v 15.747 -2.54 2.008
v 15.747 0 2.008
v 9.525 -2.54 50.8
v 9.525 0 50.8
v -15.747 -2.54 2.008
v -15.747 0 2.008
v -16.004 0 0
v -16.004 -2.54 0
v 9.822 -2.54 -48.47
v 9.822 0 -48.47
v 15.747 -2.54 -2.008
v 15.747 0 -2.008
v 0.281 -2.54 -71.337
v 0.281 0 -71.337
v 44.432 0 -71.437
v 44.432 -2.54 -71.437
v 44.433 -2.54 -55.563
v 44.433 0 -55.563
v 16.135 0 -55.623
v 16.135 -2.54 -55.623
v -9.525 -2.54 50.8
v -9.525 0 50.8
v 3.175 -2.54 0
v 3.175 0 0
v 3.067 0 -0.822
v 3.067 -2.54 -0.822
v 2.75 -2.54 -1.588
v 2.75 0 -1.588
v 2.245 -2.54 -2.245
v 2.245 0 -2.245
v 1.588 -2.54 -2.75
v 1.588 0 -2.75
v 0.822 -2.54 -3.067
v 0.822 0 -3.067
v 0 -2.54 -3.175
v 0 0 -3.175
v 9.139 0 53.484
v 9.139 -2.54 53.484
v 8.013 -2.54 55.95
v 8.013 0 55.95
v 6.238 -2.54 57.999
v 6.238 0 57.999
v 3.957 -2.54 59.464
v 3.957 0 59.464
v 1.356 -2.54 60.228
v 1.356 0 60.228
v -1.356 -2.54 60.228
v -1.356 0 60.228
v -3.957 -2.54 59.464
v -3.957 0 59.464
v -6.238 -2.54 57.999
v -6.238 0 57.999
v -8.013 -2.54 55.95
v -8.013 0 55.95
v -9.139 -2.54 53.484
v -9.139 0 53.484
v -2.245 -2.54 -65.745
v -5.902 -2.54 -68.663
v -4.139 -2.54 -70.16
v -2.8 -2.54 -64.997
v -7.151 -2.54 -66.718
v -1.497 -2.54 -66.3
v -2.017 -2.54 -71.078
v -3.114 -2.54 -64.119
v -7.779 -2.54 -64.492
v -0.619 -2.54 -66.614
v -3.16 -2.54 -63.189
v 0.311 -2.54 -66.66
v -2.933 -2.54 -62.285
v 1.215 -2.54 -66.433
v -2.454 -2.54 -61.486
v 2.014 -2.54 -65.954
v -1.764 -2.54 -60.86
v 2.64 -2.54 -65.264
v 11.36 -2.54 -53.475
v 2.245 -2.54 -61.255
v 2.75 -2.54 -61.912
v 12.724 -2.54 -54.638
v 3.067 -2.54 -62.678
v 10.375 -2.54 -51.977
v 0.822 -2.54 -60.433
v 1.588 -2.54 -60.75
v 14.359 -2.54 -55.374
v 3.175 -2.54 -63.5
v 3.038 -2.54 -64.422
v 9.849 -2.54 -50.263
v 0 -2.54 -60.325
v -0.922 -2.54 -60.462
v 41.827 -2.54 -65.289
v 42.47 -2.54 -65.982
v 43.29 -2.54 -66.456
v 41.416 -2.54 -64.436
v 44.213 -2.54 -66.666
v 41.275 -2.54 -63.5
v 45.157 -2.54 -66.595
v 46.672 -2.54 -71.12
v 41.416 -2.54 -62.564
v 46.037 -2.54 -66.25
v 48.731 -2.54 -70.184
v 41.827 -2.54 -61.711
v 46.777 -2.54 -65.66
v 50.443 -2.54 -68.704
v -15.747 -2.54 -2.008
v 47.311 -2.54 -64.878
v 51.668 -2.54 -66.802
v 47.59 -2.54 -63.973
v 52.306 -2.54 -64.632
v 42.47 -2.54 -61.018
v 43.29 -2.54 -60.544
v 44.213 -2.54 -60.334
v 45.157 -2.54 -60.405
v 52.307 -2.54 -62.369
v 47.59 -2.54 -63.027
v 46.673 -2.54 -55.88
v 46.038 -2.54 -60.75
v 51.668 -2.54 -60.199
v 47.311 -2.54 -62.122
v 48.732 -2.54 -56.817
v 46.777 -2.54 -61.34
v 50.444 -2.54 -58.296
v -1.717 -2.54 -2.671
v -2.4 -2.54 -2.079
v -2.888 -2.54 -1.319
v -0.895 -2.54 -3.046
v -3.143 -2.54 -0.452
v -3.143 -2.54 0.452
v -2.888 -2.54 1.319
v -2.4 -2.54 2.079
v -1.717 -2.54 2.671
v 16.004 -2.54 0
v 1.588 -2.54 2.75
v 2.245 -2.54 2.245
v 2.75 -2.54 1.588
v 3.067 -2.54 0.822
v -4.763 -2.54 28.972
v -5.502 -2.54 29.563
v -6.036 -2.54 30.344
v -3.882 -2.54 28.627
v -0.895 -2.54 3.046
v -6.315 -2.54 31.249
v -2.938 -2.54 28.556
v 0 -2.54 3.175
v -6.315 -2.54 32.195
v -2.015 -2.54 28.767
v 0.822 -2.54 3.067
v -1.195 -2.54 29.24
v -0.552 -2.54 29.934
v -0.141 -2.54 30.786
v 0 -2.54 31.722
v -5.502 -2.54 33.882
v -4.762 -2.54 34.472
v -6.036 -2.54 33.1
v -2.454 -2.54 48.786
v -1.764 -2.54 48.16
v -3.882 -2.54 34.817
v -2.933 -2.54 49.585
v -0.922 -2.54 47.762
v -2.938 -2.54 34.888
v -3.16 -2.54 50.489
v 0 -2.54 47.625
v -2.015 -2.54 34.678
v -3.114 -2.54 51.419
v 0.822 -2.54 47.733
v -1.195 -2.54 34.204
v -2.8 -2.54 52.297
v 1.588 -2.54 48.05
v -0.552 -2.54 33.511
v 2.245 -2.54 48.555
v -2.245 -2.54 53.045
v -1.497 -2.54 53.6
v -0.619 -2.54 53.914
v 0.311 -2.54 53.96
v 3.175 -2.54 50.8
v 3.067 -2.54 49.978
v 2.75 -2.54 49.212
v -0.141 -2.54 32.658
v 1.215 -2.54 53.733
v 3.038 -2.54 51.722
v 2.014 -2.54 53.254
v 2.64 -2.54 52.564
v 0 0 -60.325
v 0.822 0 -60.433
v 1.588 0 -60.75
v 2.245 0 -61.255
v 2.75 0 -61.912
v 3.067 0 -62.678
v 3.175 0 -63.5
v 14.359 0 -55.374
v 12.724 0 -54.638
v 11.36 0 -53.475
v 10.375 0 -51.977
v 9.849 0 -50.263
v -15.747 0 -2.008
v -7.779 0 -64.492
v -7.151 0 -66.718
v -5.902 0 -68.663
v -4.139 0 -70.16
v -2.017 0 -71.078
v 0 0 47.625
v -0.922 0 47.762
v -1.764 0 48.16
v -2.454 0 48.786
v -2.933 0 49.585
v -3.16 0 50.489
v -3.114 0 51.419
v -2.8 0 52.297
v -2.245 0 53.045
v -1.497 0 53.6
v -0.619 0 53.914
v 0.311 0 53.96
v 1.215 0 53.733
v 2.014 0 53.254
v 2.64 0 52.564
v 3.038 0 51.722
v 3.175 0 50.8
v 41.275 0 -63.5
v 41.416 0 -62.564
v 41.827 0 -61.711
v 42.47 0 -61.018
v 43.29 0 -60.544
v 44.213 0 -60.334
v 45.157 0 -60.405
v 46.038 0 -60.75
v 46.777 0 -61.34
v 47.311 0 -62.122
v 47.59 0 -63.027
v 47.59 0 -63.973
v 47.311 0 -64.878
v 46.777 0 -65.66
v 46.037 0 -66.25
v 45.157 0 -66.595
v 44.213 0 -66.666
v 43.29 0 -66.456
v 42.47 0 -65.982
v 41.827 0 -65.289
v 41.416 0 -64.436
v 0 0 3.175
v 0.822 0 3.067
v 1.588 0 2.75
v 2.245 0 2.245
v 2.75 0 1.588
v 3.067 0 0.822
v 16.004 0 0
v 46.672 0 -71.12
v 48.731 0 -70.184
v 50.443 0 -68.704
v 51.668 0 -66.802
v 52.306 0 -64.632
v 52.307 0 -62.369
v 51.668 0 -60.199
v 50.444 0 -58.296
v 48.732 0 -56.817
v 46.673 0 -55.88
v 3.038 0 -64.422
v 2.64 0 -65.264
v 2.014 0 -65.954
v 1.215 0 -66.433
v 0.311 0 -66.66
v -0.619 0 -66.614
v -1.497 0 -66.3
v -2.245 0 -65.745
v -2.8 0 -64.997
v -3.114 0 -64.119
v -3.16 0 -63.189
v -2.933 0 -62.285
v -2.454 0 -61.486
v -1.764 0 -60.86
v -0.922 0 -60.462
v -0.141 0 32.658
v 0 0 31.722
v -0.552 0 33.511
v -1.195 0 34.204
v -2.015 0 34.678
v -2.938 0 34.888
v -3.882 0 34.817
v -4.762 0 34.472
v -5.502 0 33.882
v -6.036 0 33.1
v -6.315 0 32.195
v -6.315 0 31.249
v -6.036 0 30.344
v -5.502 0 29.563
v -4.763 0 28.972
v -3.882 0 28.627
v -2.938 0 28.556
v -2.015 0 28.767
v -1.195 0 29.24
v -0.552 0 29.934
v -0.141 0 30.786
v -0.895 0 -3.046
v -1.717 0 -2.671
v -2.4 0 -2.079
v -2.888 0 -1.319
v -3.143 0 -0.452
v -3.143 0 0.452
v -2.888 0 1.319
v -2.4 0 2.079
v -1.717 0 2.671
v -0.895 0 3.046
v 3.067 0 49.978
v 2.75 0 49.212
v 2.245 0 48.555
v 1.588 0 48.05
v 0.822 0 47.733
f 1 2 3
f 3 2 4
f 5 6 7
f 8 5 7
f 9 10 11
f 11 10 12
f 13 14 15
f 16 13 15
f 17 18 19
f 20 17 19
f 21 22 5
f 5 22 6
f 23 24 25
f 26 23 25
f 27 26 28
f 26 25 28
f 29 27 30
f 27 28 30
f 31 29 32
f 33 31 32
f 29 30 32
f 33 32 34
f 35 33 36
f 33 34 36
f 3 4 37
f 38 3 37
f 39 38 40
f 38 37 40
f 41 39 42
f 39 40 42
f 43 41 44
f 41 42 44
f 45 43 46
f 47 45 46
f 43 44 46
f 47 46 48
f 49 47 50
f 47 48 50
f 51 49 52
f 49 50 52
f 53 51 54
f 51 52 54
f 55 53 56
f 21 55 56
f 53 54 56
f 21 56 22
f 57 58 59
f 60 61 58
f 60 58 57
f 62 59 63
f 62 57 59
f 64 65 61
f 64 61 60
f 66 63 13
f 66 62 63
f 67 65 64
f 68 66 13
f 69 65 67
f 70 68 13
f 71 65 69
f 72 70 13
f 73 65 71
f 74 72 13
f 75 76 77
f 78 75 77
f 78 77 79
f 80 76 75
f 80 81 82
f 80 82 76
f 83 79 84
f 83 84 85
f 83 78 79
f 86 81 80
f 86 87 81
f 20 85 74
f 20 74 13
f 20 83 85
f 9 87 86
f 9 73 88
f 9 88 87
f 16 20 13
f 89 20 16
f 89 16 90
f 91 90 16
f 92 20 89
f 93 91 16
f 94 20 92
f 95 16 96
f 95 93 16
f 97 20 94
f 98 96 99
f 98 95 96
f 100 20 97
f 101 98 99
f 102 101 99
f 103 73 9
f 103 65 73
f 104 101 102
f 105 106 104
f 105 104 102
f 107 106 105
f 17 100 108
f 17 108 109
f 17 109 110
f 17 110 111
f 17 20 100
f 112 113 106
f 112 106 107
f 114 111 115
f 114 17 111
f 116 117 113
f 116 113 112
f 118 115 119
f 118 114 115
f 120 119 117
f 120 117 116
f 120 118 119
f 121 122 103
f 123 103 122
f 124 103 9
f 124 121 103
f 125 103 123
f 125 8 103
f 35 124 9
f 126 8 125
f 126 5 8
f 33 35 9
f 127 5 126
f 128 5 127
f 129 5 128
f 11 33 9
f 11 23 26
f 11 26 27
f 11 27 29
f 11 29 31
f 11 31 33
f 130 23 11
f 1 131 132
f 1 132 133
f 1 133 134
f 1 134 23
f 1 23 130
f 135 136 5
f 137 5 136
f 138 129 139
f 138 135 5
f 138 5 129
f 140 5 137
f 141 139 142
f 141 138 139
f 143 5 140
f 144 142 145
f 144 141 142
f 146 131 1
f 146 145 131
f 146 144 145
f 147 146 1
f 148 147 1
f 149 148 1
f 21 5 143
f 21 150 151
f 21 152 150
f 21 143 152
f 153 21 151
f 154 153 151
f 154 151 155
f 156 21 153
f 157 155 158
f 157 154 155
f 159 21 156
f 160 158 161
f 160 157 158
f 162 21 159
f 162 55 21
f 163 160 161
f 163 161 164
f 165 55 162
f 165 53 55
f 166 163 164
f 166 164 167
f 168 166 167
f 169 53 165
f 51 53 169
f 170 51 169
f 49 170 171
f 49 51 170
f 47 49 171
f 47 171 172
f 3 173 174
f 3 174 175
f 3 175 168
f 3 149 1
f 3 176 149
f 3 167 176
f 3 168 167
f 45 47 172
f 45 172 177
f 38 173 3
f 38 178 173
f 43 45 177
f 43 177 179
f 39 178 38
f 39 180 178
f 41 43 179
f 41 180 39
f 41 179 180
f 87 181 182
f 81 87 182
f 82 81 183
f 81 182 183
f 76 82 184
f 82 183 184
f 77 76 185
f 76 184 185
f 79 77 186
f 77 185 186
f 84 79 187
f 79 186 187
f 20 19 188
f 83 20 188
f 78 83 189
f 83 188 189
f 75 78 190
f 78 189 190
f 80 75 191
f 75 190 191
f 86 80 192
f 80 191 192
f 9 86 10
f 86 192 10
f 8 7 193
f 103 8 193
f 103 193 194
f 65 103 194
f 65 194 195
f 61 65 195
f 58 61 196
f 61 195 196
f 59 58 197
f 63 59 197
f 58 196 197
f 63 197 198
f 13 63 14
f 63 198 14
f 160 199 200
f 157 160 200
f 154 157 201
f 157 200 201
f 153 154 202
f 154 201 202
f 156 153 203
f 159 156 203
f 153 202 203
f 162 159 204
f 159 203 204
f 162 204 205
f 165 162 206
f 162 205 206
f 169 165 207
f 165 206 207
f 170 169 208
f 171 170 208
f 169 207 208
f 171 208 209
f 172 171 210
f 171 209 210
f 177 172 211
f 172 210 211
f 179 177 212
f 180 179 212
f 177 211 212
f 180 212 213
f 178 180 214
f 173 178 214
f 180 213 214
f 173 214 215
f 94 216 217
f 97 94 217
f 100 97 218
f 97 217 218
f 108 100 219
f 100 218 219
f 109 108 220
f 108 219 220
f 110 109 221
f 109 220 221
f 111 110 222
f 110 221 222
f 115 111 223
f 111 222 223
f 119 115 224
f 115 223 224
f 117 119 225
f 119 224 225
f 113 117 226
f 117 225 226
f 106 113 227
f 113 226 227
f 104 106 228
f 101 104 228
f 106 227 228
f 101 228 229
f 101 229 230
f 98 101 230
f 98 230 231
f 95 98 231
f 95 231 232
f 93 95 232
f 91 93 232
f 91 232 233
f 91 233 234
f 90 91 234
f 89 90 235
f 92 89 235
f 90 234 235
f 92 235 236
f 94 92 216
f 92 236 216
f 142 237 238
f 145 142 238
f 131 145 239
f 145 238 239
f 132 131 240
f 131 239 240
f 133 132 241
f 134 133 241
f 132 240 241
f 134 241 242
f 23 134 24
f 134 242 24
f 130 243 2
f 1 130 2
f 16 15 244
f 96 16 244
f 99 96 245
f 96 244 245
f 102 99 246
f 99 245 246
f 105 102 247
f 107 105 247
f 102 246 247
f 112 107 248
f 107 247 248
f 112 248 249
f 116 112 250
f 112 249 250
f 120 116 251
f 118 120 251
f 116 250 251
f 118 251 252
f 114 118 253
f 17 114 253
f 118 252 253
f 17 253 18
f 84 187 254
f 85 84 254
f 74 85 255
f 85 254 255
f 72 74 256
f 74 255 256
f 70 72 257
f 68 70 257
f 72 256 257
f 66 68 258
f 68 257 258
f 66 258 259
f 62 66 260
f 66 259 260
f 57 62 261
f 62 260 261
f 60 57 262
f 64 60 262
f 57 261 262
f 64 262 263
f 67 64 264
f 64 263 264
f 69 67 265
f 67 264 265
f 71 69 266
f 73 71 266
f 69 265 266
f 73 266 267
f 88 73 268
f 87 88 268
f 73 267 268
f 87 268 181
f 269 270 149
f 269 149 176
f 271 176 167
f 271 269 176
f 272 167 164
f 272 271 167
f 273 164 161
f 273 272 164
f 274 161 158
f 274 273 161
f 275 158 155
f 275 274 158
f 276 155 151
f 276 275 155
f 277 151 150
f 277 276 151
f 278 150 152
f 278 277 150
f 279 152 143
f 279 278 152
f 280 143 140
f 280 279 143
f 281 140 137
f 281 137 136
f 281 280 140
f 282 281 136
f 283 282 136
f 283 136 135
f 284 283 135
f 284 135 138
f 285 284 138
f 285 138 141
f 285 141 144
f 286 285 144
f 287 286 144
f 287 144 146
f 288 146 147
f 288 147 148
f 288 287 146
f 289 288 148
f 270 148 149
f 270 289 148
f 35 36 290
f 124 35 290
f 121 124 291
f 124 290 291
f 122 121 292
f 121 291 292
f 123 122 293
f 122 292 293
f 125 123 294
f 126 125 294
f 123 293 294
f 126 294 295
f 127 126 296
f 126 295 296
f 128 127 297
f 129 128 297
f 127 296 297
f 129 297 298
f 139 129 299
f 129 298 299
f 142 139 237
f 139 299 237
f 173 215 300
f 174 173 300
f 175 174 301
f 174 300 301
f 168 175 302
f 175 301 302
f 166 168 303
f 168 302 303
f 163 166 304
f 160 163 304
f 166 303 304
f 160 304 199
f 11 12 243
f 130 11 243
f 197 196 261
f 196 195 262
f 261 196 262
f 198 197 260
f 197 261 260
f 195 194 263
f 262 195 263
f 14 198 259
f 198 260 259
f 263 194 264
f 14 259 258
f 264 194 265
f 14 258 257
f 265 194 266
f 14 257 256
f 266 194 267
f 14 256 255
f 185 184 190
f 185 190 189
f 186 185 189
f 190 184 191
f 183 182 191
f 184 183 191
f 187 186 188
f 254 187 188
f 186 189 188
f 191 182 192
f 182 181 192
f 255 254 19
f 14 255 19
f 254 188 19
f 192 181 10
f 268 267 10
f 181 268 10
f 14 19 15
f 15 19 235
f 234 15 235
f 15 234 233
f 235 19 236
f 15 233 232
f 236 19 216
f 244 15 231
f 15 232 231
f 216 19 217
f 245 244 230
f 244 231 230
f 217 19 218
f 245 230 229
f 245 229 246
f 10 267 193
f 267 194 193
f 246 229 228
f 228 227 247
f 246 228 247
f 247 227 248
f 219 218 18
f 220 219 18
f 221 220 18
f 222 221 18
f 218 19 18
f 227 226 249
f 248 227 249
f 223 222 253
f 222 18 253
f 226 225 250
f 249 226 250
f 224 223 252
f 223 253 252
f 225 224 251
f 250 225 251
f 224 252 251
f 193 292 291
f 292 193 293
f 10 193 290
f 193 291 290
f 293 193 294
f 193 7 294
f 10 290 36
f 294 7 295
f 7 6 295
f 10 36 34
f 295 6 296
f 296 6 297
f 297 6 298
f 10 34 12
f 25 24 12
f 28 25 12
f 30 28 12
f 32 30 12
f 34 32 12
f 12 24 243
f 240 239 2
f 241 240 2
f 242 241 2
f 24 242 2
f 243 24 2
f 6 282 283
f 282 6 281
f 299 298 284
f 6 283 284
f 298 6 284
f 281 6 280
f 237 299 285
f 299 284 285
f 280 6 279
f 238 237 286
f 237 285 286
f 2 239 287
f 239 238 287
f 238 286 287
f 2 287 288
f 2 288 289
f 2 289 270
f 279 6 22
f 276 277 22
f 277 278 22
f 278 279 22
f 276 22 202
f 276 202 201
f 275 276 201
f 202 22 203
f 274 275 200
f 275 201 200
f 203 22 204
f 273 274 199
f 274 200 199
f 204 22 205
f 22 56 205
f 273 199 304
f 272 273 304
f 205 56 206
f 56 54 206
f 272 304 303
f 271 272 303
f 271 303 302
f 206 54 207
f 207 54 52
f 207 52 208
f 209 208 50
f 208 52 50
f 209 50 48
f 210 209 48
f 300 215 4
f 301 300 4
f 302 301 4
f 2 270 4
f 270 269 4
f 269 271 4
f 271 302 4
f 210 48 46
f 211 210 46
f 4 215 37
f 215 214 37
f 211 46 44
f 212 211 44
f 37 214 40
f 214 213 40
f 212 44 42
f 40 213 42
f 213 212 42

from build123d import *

# Parameters (mm, degrees)
F0_R     = 3.175
F1_DEPTH = 2.54
F2_DEPTH = 2.54


with BuildPart() as f1:
    # F0 (on Front) → F1 (new body)
    with BuildSketch(Plane.XZ):
        with BuildLine():
            ThreePointArc((-9.525, 50.8), (-6.7351920908, 44.0648079092), (0, 41.275))
            ThreePointArc((0, 41.275), (6.7351920908, 44.0648079092), (9.525, 50.8))
            ThreePointArc((9.525, 50.8), (0, 60.325), (-9.525, 50.8))
        make_face()
        with BuildLine():
            ThreePointArc((3.175, 50.8), (2.2450640303, 48.5549359697), (0, 47.625))
            ThreePointArc((0, 47.625), (-2.2450640303, 53.0450640303), (3.175, 50.8))
        make_face(mode=Mode.SUBTRACT)
        with BuildLine():
            ThreePointArc((9.525, 50.8), (6.7351920908, 44.0648079092), (0, 41.275))
            Line((0, 41.275), (0, 31.7220508101))
            Line((0, 31.7220508101), (0, 15.875))
            ThreePointArc((0, 15.875), (10.4912828764, 11.9142187578), (15.747456912, 2.0082892734))
            Line((15.747456912, 2.0082892734), (9.525, 50.8))
        make_face()
        with BuildLine():
            Line((0, 31.7220508101), (0, 41.275))
            ThreePointArc((0, 41.275), (-6.7351920908, 44.0648079092), (-9.525, 50.8))
            Line((-9.525, 50.8), (-15.7474568676, 2.0082896216))
            ThreePointArc((-15.7474568676, 2.0082896216), (-10.4912827447, 11.9142188737), (0, 15.875))
            Line((0, 15.875), (0, 31.7220508101))
        make_face()
        with Locations((-3.175, 31.7220508101)):
            Circle(F0_R, mode=Mode.SUBTRACT)
        with BuildLine():
            ThreePointArc((15.747456912, 2.0082892734), (10.4912828764, 11.9142187578), (0, 15.875))
            Line((0, 15.875), (0, 3.175))
            ThreePointArc((0, 3.175), (2.2450640303, 2.2450640303), (3.175, 0))
            ThreePointArc((3.175, 0), (2.2450640303, -2.2450640303), (0, -3.175))
            Line((0, -3.175), (0, -15.875))
            ThreePointArc((0, -15.875), (10.4912827447, -11.9142188737), (15.7474568676, -2.0082896216))
            ThreePointArc((15.7474568676, -2.0082896216), (15.8430821303, -1.006167786), (15.875, 0))
            ThreePointArc((15.875, 0), (15.8430821414, 1.0061676109), (15.747456912, 2.0082892734))
        make_face()
        with BuildLine():
            Line((0, 3.175), (0, 15.875))
            ThreePointArc((0, 15.875), (-10.4912827447, 11.9142188737), (-15.7474568676, 2.0082896216))
            ThreePointArc((-15.7474568676, 2.0082896216), (-15.875, 8.81e-08), (-15.7474568899, -2.0082894468))
            ThreePointArc((-15.7474568899, -2.0082894468), (-10.4912828108, -11.9142188155), (0, -15.875))
            Line((0, -15.875), (0, -3.175))
            ThreePointArc((0, -3.175), (-3.175, 0), (0, 3.175))
        make_face()
        with BuildLine():
            ThreePointArc((-15.7474568899, -2.0082894468), (-15.875, 8.81e-08), (-15.7474568676, 2.0082896216))
            Line((-15.7474568676, 2.0082896216), (-16.0035761028, 0))
            Line((-16.0035761028, 0), (-15.7474568899, -2.0082894468))
        make_face()
        with BuildLine():
            Line((16.0035761028, 0), (15.747456912, 2.0082892734))
            ThreePointArc((15.747456912, 2.0082892734), (15.8430821414, 1.0061676109), (15.875, 0))
            ThreePointArc((15.875, 0), (15.8430821303, -1.006167786), (15.7474568676, -2.0082896216))
            Line((15.7474568676, -2.0082896216), (16.0035761028, 0))
        make_face()
        with BuildLine():
            ThreePointArc((0, -15.875), (-10.4912828108, -11.9142188155), (-15.7474568899, -2.0082894468))
            Line((-15.7474568899, -2.0082894468), (-7.778839662, -64.4920434004))
            ThreePointArc((-7.778839662, -64.4920434004), (-5.8853183801, -58.3175754555), (0, -55.6581573215))
            Line((0, -55.6581573215), (0, -15.875))
        make_face()
        with BuildLine():
            ThreePointArc((15.7474568676, -2.0082896216), (10.4912827447, -11.9142188737), (0, -15.875))
            Line((0, -15.875), (0, -55.6581573215))
            ThreePointArc((0, -55.6581573215), (5.545020135, -57.954979865), (7.8418426785, -63.5))
            Line((7.8418426785, -63.5), (36.5125, -63.5))
            ThreePointArc((36.5125, -63.5), (38.831302744, -57.8933836055), (44.4329150916, -55.5625183871))
            Line((44.4329150916, -55.5625183871), (16.1347817513, -55.6234282624))
            ThreePointArc((16.1347817513, -55.6234282624), (11.3599454256, -53.4750825896), (9.8221310627, -48.4701272399))
            Line((9.8221310627, -48.4701272399), (15.7474568676, -2.0082896216))
        make_face()
        with BuildLine():
            ThreePointArc((0, -55.6581573215), (-5.8853183801, -58.3175754555), (-7.778839662, -64.4920434004))
            ThreePointArc((-7.778839662, -64.4920434004), (-5.0761507437, -69.4772226177), (0.2809454712, -71.3368084216))
            ThreePointArc((0.2809454712, -71.3368084216), (5.6434752937, -68.9447849548), (7.8418426785, -63.5))
            Line((7.8418426785, -63.5), (3.175, -63.5))
            ThreePointArc((3.175, -63.5), (-2.2450640303, -65.7450640303), (0, -60.325))
            Line((0, -60.325), (0, -55.6581573215))
        make_face()
        with BuildLine():
            ThreePointArc((7.8418426785, -63.5), (5.6434752937, -68.9447849548), (0.2809454712, -71.3368084216))
            Line((0.2809454712, -71.3368084216), (44.4319013308, -71.4374793662))
            ThreePointArc((44.4319013308, -71.4374793662), (38.8309447219, -69.1062575781), (36.5125, -63.5))
            Line((36.5125, -63.5), (7.8418426785, -63.5))
        make_face()
        with BuildLine():
            ThreePointArc((36.5125, -63.5), (38.8309447219, -69.1062575781), (44.4319013308, -71.4374793662))
            ThreePointArc((44.4319013308, -71.4374793662), (50.0562575781, -69.1190552781), (52.3875, -63.5))
            ThreePointArc((52.3875, -63.5), (50.0566163945, -57.881302744), (44.4329150916, -55.5625183871))
            ThreePointArc((44.4329150916, -55.5625183871), (38.831302744, -57.8933836055), (36.5125, -63.5))
        make_face()
        with BuildLine():
            ThreePointArc((47.625, -63.5), (44.45, -66.675), (41.275, -63.5))
            ThreePointArc((41.275, -63.5), (44.45, -60.325), (47.625, -63.5))
        make_face(mode=Mode.SUBTRACT)
    extrude(amount=F1_DEPTH)

    # F0 (on Front) → F2 (join)
    with BuildSketch(Plane.XZ):
        with BuildLine():
            ThreePointArc((7.8418426785, -63.5), (5.545020135, -57.954979865), (0, -55.6581573215))
            Line((0, -55.6581573215), (0, -60.325))
            ThreePointArc((0, -60.325), (2.2450640303, -61.2549359697), (3.175, -63.5))
            Line((3.175, -63.5), (7.8418426785, -63.5))
        make_face()
    extrude(amount=F2_DEPTH)


solid = f1.part
